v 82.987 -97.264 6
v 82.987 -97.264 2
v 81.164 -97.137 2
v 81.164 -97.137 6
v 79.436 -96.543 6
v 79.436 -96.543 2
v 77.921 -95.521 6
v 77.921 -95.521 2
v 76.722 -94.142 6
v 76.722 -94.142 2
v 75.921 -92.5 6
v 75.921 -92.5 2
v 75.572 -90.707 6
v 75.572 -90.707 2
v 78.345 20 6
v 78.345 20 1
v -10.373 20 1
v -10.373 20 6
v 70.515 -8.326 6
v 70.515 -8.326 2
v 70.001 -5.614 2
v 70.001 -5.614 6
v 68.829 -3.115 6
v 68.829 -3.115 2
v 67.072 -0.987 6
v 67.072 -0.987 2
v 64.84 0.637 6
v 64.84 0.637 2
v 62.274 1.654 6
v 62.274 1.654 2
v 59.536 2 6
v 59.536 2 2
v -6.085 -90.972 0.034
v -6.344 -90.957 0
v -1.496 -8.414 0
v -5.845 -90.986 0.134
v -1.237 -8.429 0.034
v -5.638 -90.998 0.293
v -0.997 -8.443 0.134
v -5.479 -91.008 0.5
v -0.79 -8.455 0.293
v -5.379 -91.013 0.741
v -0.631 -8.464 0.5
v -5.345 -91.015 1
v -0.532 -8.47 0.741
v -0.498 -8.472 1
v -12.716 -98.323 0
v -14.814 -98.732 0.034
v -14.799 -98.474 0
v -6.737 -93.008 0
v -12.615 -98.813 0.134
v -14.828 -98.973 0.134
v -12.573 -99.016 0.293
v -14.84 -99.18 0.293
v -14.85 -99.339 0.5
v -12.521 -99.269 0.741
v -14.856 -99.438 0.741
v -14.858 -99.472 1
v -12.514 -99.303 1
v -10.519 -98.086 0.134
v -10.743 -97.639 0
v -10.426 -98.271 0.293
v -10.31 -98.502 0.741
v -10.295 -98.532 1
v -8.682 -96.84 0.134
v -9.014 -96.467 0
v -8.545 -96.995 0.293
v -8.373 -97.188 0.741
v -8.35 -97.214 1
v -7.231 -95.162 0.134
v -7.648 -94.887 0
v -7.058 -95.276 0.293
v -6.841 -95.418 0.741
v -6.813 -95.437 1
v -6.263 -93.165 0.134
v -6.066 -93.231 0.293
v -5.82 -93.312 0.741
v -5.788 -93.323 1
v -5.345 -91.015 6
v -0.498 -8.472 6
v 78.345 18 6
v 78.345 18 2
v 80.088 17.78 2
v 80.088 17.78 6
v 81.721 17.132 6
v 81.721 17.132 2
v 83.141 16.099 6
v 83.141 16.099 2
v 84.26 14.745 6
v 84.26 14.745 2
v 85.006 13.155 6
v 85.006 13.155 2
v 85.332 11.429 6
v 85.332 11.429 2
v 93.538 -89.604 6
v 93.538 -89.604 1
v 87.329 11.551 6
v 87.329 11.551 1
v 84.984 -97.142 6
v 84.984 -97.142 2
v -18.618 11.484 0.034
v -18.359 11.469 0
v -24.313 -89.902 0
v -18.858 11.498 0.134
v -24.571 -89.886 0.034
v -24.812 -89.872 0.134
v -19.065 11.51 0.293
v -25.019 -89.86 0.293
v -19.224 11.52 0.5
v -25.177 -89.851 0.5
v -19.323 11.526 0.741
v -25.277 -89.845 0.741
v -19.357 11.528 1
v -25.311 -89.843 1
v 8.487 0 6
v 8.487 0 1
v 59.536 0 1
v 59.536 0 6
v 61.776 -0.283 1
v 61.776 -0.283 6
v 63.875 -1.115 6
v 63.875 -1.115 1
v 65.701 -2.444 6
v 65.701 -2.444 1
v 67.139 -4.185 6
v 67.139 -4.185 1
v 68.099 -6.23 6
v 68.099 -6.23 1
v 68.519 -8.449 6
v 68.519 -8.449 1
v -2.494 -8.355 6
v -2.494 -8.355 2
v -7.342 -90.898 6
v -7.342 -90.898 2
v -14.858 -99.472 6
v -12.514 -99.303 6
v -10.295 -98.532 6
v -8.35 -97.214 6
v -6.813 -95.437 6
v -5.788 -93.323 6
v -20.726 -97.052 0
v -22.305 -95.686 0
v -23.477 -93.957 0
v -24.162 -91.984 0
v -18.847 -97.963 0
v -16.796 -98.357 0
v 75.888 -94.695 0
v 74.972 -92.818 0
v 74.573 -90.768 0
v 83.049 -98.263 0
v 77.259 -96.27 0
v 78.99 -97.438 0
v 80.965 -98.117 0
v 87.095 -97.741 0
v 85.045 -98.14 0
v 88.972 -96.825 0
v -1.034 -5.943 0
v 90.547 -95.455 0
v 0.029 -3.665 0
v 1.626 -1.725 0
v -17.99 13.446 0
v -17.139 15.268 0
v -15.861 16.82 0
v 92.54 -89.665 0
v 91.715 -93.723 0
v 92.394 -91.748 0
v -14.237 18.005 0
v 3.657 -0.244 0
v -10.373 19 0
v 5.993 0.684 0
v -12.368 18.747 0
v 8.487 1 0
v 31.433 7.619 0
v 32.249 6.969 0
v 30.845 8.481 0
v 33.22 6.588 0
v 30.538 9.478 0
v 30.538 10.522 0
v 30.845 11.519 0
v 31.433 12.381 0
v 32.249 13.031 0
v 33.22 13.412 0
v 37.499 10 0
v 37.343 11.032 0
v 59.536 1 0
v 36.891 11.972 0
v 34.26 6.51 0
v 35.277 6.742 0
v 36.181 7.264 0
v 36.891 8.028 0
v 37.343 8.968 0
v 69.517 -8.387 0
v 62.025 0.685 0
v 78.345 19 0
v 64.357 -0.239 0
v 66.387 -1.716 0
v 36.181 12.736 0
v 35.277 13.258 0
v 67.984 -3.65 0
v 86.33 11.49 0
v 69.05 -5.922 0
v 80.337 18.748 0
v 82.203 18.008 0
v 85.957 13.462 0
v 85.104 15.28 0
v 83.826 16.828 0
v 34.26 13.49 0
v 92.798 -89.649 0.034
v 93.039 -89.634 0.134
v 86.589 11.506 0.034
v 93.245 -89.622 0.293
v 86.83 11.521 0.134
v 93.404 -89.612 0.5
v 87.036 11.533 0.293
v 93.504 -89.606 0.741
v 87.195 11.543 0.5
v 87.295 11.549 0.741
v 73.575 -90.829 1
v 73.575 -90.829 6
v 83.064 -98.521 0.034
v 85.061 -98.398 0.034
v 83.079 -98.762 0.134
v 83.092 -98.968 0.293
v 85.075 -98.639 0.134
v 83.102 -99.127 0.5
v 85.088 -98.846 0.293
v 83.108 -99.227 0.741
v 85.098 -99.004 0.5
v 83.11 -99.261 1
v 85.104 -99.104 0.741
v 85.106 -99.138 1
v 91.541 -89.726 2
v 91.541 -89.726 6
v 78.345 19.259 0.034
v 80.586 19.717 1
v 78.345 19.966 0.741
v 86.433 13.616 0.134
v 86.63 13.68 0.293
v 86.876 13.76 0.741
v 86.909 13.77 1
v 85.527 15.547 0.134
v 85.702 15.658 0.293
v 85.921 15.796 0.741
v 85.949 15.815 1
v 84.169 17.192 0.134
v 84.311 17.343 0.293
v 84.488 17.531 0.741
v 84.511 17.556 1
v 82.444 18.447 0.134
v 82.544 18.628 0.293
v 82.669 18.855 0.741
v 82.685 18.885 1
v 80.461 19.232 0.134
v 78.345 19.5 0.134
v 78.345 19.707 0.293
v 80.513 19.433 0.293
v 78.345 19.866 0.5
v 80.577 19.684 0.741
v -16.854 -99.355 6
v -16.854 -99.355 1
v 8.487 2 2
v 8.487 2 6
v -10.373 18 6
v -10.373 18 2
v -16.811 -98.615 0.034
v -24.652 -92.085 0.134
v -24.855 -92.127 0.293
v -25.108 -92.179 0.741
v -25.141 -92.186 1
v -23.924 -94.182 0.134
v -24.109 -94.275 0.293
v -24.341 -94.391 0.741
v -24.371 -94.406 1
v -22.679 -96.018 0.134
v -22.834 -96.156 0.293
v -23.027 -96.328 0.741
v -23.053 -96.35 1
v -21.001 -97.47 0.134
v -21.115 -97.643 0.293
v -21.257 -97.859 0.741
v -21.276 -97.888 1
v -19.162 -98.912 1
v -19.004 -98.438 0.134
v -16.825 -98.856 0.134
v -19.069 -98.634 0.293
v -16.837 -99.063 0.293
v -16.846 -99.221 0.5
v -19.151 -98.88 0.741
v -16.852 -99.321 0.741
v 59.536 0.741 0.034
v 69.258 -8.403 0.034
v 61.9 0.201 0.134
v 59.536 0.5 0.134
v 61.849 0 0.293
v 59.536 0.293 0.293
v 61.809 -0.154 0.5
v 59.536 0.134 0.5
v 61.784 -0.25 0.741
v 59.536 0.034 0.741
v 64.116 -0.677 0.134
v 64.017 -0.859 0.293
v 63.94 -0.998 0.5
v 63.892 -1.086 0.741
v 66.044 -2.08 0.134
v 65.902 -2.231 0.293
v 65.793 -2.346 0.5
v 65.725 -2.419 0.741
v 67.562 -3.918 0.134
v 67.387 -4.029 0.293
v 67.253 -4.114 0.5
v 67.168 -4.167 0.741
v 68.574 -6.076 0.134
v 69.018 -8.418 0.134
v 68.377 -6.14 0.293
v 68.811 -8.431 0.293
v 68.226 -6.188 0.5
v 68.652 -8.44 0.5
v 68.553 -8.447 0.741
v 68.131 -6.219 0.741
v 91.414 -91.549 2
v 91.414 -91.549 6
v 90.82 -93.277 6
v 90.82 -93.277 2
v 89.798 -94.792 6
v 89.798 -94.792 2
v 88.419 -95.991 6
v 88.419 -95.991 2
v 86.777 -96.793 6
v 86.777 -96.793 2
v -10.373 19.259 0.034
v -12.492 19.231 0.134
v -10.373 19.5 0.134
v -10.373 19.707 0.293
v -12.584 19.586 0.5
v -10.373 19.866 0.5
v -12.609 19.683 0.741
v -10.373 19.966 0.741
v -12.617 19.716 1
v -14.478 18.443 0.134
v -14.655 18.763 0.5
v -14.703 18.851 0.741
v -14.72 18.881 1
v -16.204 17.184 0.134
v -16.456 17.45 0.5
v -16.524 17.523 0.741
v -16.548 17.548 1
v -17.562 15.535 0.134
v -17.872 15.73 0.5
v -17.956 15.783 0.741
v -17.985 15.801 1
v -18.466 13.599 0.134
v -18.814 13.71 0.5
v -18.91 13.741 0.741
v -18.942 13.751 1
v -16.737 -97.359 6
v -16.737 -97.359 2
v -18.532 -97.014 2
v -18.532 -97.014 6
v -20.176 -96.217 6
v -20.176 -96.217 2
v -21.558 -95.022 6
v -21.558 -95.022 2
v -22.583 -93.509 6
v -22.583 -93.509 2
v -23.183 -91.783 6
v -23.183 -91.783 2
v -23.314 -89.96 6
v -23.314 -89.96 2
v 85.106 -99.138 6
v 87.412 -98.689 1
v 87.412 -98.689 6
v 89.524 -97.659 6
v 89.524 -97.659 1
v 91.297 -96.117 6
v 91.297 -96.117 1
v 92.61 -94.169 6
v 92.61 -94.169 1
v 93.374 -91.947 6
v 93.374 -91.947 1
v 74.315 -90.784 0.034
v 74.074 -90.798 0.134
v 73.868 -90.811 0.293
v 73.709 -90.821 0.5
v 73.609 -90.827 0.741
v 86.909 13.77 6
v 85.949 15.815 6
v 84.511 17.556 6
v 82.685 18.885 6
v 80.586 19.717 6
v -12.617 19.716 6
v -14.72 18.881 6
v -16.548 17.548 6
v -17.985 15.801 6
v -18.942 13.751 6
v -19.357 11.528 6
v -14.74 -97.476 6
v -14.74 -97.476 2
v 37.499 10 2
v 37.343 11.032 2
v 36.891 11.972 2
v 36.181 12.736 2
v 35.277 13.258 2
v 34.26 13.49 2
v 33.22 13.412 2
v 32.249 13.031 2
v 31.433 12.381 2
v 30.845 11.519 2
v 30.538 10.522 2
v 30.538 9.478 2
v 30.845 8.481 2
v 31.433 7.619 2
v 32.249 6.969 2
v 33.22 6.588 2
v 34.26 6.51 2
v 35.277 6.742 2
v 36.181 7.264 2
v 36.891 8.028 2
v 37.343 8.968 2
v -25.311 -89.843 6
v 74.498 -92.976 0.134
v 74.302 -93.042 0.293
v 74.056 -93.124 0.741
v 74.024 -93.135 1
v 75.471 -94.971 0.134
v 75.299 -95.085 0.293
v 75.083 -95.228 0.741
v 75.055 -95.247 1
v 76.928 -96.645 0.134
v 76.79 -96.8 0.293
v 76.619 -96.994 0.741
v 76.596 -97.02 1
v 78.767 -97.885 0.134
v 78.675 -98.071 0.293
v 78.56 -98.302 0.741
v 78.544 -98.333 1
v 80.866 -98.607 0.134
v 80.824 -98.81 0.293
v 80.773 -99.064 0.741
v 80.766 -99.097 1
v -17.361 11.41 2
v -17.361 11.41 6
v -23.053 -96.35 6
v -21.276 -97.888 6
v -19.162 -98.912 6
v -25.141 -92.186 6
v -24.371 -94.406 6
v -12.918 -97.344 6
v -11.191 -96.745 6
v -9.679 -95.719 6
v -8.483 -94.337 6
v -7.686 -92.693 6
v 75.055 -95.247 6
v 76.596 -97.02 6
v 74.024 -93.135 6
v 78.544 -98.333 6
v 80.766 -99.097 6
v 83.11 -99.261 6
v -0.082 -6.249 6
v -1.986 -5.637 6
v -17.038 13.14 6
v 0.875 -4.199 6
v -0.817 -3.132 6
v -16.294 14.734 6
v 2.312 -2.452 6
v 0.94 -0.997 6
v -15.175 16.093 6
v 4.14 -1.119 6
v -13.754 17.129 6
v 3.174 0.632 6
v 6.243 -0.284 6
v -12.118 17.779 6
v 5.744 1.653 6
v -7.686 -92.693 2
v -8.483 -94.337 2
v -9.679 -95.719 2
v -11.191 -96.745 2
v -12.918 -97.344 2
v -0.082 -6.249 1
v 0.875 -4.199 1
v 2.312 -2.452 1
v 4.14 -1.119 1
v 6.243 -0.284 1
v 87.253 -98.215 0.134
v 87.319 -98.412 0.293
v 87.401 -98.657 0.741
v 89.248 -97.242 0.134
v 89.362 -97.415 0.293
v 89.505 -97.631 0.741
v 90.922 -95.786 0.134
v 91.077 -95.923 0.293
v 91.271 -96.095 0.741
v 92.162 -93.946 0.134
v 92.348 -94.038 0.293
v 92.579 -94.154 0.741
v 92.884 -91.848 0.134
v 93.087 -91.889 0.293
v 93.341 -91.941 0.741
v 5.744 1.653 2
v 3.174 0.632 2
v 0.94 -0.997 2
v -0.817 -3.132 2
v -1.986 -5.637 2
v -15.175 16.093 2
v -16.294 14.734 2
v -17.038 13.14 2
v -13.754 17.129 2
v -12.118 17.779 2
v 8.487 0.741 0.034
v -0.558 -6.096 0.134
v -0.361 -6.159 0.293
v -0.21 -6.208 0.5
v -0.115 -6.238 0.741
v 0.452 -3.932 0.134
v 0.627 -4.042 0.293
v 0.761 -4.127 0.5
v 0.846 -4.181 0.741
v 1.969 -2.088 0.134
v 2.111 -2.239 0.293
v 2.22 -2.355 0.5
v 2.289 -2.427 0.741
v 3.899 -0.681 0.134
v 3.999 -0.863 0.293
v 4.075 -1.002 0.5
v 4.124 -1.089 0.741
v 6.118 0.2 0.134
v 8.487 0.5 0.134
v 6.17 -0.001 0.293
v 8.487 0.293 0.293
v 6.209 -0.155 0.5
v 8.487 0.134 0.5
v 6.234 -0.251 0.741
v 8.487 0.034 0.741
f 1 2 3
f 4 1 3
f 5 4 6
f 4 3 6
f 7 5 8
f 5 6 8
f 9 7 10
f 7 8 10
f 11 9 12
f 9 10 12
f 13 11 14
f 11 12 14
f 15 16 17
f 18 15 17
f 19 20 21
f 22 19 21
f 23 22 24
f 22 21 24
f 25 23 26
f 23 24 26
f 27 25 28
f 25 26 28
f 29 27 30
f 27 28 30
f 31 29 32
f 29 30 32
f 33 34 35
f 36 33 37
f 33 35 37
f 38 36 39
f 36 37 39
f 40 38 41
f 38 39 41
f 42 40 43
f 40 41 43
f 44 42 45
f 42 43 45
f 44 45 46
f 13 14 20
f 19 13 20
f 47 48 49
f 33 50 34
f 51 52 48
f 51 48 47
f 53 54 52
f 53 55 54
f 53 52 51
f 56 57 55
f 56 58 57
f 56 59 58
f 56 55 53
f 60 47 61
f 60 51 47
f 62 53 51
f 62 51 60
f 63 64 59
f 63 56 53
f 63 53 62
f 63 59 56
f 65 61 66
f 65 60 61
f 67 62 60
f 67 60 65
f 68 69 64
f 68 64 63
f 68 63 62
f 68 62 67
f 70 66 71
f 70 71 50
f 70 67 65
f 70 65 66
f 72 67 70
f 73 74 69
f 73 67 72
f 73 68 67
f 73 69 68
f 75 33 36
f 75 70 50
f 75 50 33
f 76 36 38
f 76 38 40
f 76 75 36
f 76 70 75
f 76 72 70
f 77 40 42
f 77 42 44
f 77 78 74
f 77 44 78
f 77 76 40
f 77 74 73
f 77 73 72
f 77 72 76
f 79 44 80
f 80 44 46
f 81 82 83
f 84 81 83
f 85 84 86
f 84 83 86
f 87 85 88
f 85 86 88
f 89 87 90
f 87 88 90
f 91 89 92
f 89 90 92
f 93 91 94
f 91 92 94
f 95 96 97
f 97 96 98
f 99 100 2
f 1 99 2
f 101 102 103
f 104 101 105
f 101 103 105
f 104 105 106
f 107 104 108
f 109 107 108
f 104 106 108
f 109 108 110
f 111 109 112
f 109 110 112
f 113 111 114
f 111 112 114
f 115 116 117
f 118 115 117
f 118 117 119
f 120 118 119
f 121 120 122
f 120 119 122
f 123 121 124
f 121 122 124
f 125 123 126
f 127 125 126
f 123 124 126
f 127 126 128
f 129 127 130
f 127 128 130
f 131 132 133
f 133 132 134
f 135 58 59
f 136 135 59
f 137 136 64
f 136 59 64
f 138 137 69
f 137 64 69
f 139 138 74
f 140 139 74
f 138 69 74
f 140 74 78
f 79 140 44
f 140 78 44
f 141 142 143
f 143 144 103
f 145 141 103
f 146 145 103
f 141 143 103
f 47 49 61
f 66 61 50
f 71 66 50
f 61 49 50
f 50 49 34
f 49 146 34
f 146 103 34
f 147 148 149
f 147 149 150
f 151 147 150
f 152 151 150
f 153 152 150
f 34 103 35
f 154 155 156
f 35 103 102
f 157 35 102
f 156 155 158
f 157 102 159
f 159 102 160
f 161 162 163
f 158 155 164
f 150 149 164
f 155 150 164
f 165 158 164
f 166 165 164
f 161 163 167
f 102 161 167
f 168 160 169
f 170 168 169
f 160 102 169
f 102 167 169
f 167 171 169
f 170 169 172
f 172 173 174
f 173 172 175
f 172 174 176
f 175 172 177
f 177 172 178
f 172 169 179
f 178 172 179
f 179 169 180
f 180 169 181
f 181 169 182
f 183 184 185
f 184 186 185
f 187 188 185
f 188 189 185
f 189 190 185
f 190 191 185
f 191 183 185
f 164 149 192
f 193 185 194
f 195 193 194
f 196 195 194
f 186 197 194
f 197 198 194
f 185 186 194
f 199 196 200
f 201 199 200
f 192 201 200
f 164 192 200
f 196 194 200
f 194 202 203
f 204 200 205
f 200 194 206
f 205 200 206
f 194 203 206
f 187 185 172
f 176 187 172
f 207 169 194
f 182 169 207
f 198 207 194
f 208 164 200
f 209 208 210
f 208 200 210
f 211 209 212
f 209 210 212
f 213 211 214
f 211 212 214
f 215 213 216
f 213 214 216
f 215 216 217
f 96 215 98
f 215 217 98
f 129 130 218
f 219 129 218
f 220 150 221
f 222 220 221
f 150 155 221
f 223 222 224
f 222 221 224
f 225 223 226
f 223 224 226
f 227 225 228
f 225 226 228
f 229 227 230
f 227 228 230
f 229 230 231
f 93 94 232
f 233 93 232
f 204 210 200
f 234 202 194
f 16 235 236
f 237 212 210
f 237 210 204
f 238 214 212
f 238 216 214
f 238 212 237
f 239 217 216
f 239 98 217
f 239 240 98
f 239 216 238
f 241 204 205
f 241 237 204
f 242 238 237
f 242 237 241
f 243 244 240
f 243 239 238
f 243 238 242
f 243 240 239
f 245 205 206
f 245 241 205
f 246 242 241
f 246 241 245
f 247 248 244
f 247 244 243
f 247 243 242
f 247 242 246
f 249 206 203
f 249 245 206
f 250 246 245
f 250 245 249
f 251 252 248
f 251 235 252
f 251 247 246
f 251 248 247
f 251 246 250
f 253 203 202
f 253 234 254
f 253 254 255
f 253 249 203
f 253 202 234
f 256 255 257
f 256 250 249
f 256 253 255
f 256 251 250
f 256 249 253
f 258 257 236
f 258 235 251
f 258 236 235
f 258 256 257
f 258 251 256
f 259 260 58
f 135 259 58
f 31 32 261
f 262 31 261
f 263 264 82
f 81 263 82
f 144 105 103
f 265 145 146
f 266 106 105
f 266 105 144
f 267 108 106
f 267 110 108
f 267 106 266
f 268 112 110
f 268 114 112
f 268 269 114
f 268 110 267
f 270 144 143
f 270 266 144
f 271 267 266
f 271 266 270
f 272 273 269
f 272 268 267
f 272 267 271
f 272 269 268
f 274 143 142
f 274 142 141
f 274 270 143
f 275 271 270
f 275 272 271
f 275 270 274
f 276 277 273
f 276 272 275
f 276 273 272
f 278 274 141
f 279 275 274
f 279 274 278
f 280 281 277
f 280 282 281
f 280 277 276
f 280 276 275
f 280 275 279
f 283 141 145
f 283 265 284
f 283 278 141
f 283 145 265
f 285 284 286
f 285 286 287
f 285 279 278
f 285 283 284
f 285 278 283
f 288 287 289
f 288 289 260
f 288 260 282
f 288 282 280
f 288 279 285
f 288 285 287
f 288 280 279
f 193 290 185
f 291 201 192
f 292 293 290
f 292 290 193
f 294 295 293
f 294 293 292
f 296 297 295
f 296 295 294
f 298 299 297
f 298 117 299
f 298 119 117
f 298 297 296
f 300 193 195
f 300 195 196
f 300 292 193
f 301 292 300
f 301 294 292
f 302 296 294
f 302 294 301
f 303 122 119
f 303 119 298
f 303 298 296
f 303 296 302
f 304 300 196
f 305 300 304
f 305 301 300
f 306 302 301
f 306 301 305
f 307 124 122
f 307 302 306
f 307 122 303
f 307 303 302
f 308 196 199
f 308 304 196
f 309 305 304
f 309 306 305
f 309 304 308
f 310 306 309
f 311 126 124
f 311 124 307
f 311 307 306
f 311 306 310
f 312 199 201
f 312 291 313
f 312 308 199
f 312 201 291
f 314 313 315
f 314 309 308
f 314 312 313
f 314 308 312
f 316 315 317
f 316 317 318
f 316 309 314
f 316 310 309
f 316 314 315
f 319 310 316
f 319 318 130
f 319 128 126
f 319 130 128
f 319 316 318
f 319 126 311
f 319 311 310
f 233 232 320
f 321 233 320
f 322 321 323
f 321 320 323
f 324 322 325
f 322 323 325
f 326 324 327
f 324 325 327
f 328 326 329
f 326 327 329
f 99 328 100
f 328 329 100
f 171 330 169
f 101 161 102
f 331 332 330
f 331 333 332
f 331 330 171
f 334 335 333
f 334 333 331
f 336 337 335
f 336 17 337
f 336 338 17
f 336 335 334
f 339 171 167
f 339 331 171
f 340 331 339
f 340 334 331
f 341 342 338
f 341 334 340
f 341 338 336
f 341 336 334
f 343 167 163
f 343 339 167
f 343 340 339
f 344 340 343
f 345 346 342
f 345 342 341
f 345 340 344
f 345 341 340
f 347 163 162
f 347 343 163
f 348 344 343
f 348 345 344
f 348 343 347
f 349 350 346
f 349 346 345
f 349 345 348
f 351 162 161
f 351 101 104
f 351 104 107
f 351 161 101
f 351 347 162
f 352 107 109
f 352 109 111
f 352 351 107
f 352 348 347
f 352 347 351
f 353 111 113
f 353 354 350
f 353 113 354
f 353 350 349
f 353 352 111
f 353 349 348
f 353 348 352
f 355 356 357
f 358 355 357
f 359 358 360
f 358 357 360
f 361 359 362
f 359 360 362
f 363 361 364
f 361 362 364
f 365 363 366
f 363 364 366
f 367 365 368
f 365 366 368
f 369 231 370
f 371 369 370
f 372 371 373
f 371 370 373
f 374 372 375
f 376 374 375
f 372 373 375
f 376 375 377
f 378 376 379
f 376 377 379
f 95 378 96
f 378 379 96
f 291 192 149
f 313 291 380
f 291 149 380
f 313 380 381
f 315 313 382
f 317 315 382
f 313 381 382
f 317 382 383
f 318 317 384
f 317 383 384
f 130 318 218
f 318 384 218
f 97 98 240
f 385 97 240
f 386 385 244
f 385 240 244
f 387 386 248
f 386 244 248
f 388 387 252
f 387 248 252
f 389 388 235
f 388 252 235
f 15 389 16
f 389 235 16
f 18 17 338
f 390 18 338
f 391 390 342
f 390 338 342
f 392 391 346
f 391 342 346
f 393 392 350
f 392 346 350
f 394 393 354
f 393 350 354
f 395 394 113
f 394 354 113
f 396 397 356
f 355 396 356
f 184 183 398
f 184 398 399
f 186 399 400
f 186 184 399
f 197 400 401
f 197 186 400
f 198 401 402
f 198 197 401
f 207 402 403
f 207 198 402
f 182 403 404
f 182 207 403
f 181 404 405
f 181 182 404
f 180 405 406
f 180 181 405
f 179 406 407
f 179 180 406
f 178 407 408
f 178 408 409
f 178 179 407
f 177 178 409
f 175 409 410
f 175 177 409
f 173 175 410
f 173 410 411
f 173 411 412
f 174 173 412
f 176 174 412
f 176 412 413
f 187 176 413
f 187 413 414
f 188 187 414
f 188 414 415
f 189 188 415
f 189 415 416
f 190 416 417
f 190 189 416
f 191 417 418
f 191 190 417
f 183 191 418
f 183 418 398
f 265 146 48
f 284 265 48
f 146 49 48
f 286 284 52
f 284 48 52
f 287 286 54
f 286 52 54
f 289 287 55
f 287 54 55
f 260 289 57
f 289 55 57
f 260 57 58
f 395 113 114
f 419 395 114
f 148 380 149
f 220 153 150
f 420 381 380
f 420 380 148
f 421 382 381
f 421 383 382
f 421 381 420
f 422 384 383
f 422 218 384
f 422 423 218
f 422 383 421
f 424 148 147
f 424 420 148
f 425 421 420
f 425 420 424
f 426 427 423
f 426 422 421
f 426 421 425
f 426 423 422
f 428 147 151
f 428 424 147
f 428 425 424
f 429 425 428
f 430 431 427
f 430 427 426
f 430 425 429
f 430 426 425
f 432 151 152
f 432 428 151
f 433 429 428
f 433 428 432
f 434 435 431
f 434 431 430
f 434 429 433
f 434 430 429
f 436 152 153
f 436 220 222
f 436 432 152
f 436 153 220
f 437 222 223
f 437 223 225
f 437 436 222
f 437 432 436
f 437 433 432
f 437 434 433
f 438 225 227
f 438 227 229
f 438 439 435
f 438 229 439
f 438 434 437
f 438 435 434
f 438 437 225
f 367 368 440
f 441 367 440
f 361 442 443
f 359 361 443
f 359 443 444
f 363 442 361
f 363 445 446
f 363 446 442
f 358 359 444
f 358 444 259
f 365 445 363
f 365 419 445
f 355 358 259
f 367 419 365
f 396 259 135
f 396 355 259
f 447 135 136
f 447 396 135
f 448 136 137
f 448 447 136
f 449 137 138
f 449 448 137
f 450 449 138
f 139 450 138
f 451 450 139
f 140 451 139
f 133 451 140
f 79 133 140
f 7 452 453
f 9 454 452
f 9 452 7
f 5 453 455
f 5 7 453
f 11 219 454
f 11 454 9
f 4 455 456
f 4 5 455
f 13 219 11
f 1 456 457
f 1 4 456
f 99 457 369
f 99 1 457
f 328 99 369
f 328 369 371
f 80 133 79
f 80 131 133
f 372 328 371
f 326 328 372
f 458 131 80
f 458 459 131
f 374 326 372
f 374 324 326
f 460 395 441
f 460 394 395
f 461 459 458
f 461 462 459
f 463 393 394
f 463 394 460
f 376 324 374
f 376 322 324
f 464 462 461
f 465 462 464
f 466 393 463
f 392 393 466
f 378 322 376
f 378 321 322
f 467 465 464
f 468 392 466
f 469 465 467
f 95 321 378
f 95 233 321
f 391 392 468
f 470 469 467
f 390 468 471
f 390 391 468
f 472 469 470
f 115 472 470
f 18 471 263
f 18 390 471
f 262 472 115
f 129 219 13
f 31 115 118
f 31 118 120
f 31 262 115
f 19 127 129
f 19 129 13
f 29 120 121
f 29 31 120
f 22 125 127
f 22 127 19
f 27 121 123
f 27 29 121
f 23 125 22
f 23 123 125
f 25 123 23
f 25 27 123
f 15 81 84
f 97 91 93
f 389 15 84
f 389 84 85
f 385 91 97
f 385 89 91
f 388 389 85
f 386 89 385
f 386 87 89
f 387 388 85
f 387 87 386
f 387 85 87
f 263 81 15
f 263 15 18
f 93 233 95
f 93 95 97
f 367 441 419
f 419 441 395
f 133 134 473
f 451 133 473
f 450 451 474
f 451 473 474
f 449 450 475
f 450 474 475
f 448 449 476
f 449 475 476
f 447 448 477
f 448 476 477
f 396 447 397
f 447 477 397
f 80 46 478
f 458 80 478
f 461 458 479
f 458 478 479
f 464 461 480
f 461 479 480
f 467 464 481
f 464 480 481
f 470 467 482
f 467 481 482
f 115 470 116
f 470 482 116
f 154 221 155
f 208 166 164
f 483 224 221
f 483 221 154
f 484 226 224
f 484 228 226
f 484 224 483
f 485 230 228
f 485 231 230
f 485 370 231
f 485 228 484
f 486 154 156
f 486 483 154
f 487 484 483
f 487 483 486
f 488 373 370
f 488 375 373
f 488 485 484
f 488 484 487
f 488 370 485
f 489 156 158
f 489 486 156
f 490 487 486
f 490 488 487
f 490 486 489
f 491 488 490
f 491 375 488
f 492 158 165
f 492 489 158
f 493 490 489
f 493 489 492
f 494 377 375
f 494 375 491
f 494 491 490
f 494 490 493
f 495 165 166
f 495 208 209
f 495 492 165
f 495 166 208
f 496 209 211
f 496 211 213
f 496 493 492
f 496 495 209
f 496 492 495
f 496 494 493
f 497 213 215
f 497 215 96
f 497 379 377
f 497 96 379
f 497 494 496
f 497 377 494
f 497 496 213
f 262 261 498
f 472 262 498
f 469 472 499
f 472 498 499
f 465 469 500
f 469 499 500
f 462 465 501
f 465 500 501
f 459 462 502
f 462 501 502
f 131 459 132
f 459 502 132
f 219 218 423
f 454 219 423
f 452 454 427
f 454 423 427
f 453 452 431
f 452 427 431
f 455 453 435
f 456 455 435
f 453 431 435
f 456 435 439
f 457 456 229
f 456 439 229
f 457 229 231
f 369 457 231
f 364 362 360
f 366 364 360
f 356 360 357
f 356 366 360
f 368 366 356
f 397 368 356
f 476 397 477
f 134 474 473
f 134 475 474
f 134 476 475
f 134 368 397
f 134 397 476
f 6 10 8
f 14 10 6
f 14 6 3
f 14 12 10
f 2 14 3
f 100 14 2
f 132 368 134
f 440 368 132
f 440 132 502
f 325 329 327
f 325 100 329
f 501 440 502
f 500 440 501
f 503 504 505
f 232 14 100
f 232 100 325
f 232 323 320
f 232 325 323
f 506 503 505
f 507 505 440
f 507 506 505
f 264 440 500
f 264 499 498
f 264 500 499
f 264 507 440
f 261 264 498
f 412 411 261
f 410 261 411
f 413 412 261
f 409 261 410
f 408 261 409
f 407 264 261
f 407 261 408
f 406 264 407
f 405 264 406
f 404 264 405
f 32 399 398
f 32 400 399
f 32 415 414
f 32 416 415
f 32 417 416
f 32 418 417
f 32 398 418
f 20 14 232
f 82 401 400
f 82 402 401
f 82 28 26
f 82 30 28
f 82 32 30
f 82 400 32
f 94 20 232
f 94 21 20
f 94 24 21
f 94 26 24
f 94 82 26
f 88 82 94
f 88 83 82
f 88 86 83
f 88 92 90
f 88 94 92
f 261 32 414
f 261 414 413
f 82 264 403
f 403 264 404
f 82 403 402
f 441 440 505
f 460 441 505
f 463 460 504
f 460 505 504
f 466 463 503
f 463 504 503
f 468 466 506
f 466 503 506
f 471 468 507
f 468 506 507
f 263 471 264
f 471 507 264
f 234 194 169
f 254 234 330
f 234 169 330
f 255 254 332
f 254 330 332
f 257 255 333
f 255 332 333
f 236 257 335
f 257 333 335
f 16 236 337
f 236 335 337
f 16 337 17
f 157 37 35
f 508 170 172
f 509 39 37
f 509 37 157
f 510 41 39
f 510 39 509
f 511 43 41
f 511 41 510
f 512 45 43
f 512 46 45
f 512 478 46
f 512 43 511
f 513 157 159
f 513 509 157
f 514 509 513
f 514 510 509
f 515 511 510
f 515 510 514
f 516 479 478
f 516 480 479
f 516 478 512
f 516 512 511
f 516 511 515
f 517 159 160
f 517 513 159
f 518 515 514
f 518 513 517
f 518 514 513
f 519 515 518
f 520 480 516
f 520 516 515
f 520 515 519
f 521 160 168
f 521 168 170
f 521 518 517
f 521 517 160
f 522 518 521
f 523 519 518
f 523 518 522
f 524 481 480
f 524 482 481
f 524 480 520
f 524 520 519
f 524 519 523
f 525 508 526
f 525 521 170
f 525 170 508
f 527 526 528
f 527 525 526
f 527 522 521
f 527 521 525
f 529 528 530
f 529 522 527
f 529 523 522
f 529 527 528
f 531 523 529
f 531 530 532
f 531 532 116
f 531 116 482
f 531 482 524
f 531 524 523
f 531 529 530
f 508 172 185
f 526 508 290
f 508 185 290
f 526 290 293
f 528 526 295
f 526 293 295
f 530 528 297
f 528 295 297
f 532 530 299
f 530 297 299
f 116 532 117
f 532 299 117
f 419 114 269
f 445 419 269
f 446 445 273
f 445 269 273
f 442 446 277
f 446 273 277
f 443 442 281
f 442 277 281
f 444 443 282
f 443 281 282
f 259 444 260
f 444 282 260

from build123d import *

# Parameters (mm, degrees)
ESQUISSE1_R        = 3.5
BOSS_EXTRU_1_DEPTH = 2
BOSS_EXTRU_2_START = 2
BOSS_EXTRU_2_DEPTH = 4
CONG_1_R           = 1


with BuildPart() as part:
    # Esquisse1 → Boss.-Extru.1 (new body)
    with BuildSketch(Plane.XY):
        with BuildLine():
            Line((8.486931566, 0), (59.535501901, 0))
            ThreePointArc((59.535501901, 0), (65.701431316, -2.44398639), (68.518594603, -8.448596789))
            Line((68.518594603, -8.448596789), (73.575299132, -90.829048435))
            ThreePointArc((73.575299132, -90.829048435), (76.596287018, -97.01955194), (83.109795045, -99.260737926))
            Line((83.109795045, -99.260737926), (85.106037868, -99.13820388))
            ThreePointArc((85.106037868, -99.13820388), (91.296541372, -96.117215994), (93.537727359, -89.603707966))
            Line((93.537727359, -89.603707966), (87.328590379, 11.551403211))
            ThreePointArc((87.328590379, 11.551403211), (84.511427092, 17.55601361), (78.345497677, 20))
            Line((78.345497677, 20), (-10.372916358, 20))
            ThreePointArc((-10.372916358, 20), (-16.547500996, 17.547862594), (-19.357434532, 11.527667678))
            Line((-19.357434532, 11.527667678), (-25.311005353, -89.842886985))
            ThreePointArc((-25.311005353, -89.842886985), (-23.052618299, -96.350450996), (-16.854154857, -99.355072837))
            Line((-16.854154857, -99.355072837), (-14.857595263, -99.472332322))
            ThreePointArc((-14.857595263, -99.472332322), (-8.350031252, -97.213945268), (-5.34540941, -91.015481826))
            Line((-5.34540941, -91.015481826), (-0.497586608, -8.472332322))
            ThreePointArc((-0.497586608, -8.472332322), (2.312346928, -2.452137406), (8.486931566, 0))
        make_face()
        with Locations((33.998753696, 10)):
            Circle(ESQUISSE1_R, mode=Mode.SUBTRACT)
    extrude(amount=BOSS_EXTRU_1_DEPTH)

    # Esquisse1<4> → Boss.-Extru.2 (add)
    with BuildSketch(Plane.XY.offset(BOSS_EXTRU_2_START)):
        with BuildLine():
            Line((8.486931566, 0), (59.535501901, 0))
            ThreePointArc((59.535501901, 0), (65.701431316, -2.44398639), (68.518594603, -8.448596789))
            Line((68.518594603, -8.448596789), (73.575299132, -90.829048435))
            ThreePointArc((73.575299132, -90.829048435), (76.596287018, -97.01955194), (83.109795045, -99.260737926))
            Line((83.109795045, -99.260737926), (85.106037868, -99.13820388))
            ThreePointArc((85.106037868, -99.13820388), (91.296541372, -96.117215994), (93.537727359, -89.603707966))
            Line((93.537727359, -89.603707966), (87.328590379, 11.551403211))
            ThreePointArc((87.328590379, 11.551403211), (84.511427092, 17.55601361), (78.345497677, 20))
            Line((78.345497677, 20), (-10.372916358, 20))
            ThreePointArc((-10.372916358, 20), (-16.547500996, 17.547862594), (-19.357434532, 11.527667678))
            Line((-19.357434532, 11.527667678), (-25.311005353, -89.842886985))
            ThreePointArc((-25.311005353, -89.842886985), (-23.052618299, -96.350450996), (-16.854154857, -99.355072837))
            Line((-16.854154857, -99.355072837), (-14.857595263, -99.472332322))
            ThreePointArc((-14.857595263, -99.472332322), (-8.350031252, -97.213945268), (-5.34540941, -91.015481826))
            Line((-5.34540941, -91.015481826), (-0.497586608, -8.472332322))
            ThreePointArc((-0.497586608, -8.472332322), (2.312346928, -2.452137406), (8.486931566, 0))
        make_face()
        with BuildLine():
            Line((-10.372916358, 18), (78.345497677, 18))
            ThreePointArc((78.345497677, 18), (83.141220555, 16.099121696), (85.332347556, 11.428869164))
            Line((85.332347556, 11.428869164), (91.541484536, -89.726242013))
            ThreePointArc((91.541484536, -89.726242013), (89.79833988, -94.792303812), (84.983503821, -97.141961057))
            Line((84.983503821, -97.141961057), (82.987260998, -97.264495104))
            ThreePointArc((82.987260998, -97.264495104), (77.921199199, -95.521350447), (75.571541954, -90.706514388))
            Line((75.571541954, -90.706514388), (70.514837426, -8.326062742))
            ThreePointArc((70.514837426, -8.326062742), (67.071637853, -0.987094477), (59.535501901, 2))
            Line((59.535501901, 2), (8.486931566, 2))
            ThreePointArc((8.486931566, 2), (0.940217009, -0.997056829), (-2.494146203, -8.355072837))
            Line((-2.494146203, -8.355072837), (-7.341969005, -90.898222342))
            ThreePointArc((-7.341969005, -90.898222342), (-9.678897103, -95.719249463), (-14.740335779, -97.475772727))
            Line((-14.740335779, -97.475772727), (-16.736895373, -97.358513243))
            ThreePointArc((-16.736895373, -97.358513243), (-21.557922495, -95.021585145), (-23.314445759, -89.960146469))
            Line((-23.314445759, -89.960146469), (-17.360874938, 11.410408194))
            ThreePointArc((-17.360874938, 11.410408194), (-15.175371076, 16.092782018), (-10.372916358, 18))
        make_face(mode=Mode.SUBTRACT)
    extrude(amount=BOSS_EXTRU_2_DEPTH)

    # Congé1
    cong_1_edges = [part.edges().sort_by_distance(p)[0] for p in [
        (-22.334219943, -39.157609653, 0),
        (-23.052618299, -96.350450996, 0),
        (-15.85587506, -99.41370258, 0),
        (-8.350031252, -97.213945268, 0),
        (-2.921498009, -49.743907074, 0),
        (2.312346928, -2.452137406, 0),
        (34.011216733, 0, 0),
        (65.701431316, -2.44398639, 0),
        (71.046946867, -49.638822612, 0),
        (76.596287018, -97.01955194, 0),
        (84.107916456, -99.199470903, 0),
        (91.296541372, -96.117215994, 0),
        (90.433158869, -39.026152378, 0),
        (84.511427092, 17.55601361, 0),
        (33.986290659, 20, 0),
        (-16.547500996, 17.547862594, 0),
    ]]
    fillet(cong_1_edges, radius=CONG_1_R)


solid = part.part
